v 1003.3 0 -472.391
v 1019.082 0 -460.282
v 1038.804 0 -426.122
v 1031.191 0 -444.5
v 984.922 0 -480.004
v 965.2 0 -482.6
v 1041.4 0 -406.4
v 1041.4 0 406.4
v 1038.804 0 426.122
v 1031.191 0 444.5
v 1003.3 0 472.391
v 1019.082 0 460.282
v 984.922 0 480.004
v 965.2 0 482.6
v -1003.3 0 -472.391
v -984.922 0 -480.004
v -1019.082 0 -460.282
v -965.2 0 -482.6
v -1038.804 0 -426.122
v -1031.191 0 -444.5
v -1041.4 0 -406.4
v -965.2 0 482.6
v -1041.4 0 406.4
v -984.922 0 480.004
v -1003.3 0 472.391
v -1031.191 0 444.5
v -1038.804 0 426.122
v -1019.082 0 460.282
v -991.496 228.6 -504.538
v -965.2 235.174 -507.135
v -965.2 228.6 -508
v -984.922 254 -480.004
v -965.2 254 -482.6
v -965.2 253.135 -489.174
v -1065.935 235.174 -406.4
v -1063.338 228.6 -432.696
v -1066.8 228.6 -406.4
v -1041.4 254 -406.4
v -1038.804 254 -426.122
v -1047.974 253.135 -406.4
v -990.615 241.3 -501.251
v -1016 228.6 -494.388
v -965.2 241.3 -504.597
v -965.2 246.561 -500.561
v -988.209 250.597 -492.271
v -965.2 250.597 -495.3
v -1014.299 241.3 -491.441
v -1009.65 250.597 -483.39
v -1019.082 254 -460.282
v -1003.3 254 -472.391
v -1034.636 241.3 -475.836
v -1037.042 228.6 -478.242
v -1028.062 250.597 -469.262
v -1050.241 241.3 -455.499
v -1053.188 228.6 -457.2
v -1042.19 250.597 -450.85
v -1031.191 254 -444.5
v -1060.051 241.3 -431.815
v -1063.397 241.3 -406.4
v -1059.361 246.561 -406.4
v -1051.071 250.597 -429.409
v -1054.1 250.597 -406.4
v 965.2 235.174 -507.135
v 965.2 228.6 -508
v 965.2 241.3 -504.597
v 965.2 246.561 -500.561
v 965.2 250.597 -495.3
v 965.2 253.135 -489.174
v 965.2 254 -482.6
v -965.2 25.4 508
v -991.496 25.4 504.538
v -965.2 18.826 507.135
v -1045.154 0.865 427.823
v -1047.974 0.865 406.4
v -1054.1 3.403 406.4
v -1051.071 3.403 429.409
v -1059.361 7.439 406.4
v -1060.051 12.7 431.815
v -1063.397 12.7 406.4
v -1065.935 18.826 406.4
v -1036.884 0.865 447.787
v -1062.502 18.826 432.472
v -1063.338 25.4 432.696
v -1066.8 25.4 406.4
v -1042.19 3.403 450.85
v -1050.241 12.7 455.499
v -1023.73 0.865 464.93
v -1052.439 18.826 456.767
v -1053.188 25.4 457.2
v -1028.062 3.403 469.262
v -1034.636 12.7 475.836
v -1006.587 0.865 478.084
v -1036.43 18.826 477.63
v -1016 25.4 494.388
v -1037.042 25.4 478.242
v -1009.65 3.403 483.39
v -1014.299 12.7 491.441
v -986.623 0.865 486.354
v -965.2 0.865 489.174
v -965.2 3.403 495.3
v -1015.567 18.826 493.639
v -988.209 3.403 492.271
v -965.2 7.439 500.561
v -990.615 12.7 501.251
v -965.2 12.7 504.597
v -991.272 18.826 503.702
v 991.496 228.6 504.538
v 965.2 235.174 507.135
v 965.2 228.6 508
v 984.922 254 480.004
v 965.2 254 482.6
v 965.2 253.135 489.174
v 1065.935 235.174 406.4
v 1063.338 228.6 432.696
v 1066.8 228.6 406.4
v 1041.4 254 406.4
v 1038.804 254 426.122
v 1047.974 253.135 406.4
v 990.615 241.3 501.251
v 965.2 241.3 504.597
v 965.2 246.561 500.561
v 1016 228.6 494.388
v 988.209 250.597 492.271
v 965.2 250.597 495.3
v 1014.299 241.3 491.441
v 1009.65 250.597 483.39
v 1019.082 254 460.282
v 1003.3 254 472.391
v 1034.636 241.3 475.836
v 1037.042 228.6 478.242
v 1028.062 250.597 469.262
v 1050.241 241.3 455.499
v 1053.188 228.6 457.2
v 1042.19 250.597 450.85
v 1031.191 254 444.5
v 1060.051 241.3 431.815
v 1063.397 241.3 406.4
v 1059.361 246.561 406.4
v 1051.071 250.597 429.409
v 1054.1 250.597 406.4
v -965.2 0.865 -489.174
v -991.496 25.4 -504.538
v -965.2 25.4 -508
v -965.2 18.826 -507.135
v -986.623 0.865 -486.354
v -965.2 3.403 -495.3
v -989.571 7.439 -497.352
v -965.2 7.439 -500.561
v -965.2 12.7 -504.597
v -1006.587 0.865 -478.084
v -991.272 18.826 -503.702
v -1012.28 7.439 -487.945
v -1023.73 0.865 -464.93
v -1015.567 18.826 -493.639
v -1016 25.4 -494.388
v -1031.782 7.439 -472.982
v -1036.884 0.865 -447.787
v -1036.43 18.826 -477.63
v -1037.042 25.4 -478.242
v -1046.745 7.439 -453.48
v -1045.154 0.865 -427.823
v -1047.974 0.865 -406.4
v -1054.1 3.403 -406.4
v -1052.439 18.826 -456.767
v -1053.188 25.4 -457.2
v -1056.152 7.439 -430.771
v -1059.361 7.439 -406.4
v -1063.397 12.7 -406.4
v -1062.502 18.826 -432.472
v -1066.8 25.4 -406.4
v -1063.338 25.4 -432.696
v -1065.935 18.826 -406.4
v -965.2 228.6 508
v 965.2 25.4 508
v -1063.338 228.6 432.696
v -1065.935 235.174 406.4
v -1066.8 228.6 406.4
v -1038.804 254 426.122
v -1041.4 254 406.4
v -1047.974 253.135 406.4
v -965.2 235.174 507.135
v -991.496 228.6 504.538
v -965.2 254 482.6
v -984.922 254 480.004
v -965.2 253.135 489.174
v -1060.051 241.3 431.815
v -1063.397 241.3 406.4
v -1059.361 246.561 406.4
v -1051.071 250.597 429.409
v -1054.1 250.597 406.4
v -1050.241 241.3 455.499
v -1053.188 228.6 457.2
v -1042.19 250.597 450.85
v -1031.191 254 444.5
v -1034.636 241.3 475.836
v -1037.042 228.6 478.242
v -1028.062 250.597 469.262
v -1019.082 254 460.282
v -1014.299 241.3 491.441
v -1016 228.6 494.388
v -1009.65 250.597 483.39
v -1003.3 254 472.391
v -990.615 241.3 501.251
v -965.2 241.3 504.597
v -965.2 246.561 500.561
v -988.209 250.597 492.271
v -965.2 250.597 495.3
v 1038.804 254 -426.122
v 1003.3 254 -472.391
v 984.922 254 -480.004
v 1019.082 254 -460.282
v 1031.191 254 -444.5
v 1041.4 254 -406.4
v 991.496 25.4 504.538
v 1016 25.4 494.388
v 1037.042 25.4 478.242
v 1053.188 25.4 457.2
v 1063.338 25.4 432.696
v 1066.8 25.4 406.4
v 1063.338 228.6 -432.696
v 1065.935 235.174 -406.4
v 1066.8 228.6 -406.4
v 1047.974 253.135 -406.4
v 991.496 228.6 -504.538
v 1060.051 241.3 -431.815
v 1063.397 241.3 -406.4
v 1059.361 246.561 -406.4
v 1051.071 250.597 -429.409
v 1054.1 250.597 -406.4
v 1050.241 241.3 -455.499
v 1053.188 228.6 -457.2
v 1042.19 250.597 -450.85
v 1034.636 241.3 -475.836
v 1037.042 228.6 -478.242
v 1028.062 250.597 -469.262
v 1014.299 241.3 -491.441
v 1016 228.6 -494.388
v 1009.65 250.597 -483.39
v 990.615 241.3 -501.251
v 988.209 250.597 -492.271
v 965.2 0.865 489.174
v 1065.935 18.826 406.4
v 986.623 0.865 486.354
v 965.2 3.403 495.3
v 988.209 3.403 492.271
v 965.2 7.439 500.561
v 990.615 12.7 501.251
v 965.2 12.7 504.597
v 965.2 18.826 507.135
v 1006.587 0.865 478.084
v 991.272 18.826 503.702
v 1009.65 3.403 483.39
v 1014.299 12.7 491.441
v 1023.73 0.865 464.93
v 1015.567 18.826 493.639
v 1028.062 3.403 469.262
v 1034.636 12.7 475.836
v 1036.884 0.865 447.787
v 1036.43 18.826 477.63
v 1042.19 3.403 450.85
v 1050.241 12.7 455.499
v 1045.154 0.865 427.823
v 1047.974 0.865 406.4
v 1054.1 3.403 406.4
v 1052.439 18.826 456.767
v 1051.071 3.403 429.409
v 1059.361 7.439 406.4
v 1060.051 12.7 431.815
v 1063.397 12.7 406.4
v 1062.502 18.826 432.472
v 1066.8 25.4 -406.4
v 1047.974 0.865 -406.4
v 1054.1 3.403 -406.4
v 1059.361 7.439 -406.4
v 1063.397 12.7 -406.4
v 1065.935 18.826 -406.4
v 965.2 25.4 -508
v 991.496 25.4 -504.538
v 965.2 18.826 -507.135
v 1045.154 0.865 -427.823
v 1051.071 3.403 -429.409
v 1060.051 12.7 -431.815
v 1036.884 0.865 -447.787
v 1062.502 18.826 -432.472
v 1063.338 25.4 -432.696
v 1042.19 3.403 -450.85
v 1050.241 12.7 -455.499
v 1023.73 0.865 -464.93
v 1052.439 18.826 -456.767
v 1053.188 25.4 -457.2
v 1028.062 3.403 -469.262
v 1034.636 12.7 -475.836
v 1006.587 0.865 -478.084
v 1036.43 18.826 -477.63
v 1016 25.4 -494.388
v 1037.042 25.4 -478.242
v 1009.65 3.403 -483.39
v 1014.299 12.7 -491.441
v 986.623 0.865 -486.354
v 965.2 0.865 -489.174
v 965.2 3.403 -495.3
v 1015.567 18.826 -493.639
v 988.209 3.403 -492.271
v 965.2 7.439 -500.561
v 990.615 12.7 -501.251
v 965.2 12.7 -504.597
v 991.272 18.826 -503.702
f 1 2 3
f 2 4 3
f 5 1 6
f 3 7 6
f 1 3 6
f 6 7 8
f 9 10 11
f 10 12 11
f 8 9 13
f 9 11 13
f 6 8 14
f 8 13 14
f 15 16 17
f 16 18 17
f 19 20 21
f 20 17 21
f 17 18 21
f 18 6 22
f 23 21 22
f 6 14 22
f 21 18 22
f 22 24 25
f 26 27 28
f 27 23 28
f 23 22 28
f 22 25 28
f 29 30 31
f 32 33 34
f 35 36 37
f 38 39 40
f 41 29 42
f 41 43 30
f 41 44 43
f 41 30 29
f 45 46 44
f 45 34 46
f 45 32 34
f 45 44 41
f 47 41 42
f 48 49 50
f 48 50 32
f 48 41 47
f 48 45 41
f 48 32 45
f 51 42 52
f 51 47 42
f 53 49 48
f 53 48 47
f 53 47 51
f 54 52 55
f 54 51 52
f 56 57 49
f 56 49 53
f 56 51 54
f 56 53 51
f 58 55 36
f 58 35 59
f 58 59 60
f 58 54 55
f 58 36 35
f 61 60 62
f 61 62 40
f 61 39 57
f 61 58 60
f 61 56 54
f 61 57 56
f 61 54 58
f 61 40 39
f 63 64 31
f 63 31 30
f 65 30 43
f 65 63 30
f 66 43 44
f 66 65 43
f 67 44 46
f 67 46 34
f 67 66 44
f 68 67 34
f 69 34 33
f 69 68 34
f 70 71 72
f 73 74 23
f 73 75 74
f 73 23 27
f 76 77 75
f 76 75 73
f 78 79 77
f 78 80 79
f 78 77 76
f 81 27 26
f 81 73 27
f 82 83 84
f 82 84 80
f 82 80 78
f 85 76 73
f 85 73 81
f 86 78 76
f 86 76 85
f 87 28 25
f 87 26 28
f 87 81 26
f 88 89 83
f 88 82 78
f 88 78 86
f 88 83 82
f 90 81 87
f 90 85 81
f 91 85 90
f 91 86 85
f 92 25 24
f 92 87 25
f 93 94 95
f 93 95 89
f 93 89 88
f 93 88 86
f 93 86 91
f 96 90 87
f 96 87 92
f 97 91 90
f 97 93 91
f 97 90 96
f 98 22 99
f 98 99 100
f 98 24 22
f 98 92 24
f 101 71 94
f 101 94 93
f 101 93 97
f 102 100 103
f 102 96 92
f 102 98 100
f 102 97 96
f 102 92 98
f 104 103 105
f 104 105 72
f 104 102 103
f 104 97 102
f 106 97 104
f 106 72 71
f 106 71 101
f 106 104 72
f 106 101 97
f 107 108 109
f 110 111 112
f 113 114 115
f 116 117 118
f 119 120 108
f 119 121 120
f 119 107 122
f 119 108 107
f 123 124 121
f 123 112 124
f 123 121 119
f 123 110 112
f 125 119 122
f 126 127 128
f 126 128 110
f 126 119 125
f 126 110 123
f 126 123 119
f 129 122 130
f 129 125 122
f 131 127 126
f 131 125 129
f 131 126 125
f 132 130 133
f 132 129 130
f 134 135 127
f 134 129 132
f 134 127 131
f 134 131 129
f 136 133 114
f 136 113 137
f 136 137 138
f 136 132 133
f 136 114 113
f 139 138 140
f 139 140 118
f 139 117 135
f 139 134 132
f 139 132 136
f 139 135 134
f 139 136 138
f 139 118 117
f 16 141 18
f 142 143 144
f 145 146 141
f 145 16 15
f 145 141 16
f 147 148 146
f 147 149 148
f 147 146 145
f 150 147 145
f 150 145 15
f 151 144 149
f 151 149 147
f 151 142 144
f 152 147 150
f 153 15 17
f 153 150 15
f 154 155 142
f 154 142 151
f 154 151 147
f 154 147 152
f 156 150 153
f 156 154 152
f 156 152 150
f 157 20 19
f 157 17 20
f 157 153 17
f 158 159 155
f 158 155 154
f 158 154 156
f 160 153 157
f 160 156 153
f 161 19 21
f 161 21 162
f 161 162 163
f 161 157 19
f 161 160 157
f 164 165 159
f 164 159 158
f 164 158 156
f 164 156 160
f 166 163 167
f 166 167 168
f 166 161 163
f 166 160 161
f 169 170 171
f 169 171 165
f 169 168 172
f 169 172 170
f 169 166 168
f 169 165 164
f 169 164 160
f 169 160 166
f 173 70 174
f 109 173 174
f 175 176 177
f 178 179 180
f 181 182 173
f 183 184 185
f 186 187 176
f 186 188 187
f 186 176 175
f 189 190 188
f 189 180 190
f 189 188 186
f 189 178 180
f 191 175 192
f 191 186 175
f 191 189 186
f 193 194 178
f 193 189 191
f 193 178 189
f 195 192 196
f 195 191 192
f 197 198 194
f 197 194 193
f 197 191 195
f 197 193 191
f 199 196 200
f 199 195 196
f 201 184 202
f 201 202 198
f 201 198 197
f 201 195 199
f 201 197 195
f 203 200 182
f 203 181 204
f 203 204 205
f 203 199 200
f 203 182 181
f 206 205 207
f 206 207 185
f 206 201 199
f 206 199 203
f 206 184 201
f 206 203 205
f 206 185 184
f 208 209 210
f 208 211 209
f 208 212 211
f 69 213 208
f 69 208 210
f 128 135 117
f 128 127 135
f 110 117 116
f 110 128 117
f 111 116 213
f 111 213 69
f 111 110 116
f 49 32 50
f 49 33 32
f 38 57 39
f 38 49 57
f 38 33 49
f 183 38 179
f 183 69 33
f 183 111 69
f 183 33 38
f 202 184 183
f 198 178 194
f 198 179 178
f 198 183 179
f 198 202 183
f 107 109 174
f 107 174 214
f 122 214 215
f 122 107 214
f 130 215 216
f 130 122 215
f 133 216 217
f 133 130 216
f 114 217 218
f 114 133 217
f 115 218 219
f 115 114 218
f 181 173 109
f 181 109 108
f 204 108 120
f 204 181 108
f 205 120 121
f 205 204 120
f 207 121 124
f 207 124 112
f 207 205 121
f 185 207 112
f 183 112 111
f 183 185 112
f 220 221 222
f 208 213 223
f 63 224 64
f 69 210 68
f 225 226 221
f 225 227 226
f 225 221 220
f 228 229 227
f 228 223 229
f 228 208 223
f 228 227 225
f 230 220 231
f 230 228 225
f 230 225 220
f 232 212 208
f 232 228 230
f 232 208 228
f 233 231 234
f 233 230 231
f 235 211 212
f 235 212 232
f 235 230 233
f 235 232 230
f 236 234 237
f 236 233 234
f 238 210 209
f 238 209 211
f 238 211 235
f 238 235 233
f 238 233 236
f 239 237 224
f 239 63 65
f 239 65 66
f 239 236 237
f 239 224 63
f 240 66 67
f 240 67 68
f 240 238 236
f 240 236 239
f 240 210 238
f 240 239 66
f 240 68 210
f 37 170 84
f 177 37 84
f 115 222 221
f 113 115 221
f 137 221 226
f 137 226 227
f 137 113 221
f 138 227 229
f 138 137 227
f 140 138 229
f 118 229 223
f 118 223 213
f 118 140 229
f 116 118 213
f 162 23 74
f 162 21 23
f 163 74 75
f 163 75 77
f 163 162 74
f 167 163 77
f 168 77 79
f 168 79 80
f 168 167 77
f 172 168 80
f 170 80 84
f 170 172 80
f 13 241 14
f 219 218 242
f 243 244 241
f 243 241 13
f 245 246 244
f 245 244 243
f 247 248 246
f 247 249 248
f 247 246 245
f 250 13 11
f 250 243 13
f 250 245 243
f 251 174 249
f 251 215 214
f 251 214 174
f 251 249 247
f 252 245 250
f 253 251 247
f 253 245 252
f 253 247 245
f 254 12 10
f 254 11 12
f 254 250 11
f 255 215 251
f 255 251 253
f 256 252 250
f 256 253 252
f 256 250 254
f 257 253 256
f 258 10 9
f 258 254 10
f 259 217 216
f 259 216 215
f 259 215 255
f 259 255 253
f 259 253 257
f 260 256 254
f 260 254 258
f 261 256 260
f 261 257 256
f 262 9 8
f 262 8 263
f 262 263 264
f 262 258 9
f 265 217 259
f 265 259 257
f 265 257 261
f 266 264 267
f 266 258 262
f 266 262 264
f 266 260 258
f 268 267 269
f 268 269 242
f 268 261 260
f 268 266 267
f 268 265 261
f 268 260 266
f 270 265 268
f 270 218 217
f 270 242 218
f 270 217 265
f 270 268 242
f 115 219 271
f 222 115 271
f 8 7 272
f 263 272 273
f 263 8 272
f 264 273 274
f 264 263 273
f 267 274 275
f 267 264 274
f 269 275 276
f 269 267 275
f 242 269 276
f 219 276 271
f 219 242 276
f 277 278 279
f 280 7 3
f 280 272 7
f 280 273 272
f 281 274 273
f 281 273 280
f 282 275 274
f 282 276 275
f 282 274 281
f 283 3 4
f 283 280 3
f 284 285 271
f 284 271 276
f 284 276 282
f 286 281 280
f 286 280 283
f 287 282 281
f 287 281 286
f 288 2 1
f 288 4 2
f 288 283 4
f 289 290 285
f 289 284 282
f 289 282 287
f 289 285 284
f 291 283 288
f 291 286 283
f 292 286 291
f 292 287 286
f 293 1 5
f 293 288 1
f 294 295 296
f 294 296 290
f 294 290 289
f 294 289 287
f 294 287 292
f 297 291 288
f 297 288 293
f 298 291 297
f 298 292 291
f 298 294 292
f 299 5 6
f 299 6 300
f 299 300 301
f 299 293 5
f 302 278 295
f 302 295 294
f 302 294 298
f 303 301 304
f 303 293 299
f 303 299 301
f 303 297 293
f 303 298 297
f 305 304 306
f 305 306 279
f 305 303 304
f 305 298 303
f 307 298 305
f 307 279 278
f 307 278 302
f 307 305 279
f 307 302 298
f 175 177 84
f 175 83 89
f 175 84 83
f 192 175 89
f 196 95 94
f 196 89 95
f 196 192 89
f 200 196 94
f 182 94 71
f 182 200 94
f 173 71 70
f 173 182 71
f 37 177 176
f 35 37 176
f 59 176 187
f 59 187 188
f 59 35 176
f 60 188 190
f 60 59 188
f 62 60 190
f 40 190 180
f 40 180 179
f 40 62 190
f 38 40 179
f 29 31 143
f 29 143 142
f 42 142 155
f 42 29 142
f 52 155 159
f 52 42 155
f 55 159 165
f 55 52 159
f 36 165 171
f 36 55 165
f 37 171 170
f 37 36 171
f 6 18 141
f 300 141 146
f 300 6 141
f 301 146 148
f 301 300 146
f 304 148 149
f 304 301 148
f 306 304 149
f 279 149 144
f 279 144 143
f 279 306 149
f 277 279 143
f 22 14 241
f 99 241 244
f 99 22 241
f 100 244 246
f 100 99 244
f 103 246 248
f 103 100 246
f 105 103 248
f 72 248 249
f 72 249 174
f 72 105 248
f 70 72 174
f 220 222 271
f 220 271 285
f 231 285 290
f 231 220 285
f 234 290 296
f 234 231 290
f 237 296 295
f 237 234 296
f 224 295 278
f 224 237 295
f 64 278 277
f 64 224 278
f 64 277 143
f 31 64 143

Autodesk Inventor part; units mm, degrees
ref_plane "YZ Plane" through (0, 0, 0) normal (1, 0, 0) x (0, 1, 0)
ref_plane "XZ Plane" through (0, 0, 0) normal (0, 1, 0) x (-1, 0, 0)
ref_plane "XY Plane" through (0, 0, 0) normal (0, 0, 1) x (1, 0, 0)
sketch "Sketch1" plane through (0, 0, 0) normal (0, 1, 0) x (-1, 0, 0)
  line L0 (1066.8, 508) -> (-1066.8, 508)
  line L1 (-1066.8, 508) -> (-1066.8, -508)
  line L2 (-1066.8, -508) -> (1066.8, -508)
  line L3 (1066.8, -508) -> (1066.8, 508)
  line L4 (1066.8, 508) -> (-1066.8, -508) construction
  line L5 (-1066.8, 508) -> (1066.8, -508) construction
  point P0 (0, 0)
  dimension "d0" = 1016
  dimension "d1" = 2133.6
extrude "Extrusion1" add sketch "Sketch1" along normal blind 254
fillet "Fillet1" radius 101.6 4 edges at (1066.8, 127, 508) (1066.8, 127, -508) (-1066.8, 127, 508) (-1066.8, 127, -508)
fillet "Fillet2" radius 25.4 16 edges at (-1037.042, 254, -478.242) (-1066.8, 254, 0) (-1037.042, 254, 478.242) (0, 254, 508) (1037.042, 254, 478.242) (1066.8, 254, 0) (1037.042, 254, -478.242) (0, 254, -508) (-1037.042, 0, -478.242) (-1066.8, 0, 0) (-1037.042, 0, 478.242) (0, 0, 508) (1037.042, 0, 478.242) (1066.8, 0, 0) (1037.042, 0, -478.242) (0, 0, -508)
properties part number "mattress"
